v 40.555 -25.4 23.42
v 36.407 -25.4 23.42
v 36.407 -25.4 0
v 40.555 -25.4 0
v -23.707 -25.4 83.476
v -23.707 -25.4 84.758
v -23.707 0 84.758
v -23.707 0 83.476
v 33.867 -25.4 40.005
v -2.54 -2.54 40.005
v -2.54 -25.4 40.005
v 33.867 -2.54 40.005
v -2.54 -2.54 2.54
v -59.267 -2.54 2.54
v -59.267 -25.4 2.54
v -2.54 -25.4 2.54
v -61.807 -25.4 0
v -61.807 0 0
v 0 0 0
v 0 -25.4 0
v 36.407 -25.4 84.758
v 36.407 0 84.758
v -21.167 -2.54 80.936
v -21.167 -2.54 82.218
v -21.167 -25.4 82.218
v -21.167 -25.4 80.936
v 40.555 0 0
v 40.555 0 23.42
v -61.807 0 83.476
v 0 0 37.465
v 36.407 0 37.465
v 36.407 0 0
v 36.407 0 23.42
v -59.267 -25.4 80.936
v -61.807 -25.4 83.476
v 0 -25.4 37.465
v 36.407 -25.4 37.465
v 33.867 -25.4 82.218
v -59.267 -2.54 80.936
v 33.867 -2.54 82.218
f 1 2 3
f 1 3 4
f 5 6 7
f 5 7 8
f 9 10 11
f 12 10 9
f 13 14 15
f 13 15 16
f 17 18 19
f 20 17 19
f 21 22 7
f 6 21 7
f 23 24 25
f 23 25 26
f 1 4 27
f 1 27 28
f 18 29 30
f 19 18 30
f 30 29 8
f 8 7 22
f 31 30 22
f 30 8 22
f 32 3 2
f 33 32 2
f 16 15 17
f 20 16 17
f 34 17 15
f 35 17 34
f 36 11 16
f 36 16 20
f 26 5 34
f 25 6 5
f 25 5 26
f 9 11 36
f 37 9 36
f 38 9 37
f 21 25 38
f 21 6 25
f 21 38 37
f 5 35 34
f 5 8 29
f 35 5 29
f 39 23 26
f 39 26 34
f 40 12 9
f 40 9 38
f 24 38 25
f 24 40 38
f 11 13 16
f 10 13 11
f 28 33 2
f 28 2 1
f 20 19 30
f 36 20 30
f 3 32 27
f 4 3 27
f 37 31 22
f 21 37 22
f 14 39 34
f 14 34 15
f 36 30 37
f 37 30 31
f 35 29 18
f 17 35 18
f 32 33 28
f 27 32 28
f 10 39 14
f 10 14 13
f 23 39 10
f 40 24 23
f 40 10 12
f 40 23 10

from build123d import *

# Parameters (mm, degrees)
F0_W     = 23.7066559494
F0_H     = 46.0103526711
F1_DEPTH = 25.4
F0_W_2   = 4.1480958462
F0_H_2   = 23.419957608
F2_T     = -2.54


with BuildPart() as f1:
    # F0 (on Front) → F1 (new body)
    with BuildSketch(Plane.XZ):
        Polygon((-23.7066559494, 84.7575515509), (-23.7066559494, 83.4757313132), (0, 83.4757313132), (0, 37.4653786421), (36.4066660404, 37.4653786421), (36.4066660404, 84.7575515509), align=None)
        Polygon((-23.7066559494, 83.4757313132), (-61.8066713214, 83.4757313132), (-61.8066713214, 0), (0, 0), (0, 37.4653786421), (-23.7066559494, 37.4653786421), align=None)
        with Locations((-11.8533279747, 60.4705549777)):
            Rectangle(F0_W, F0_H)
    extrude(amount=F1_DEPTH)

    # F2
    f2_openings = [f1.faces().sort_by_distance(p)[0] for p in [
        (-18.586419, -25.4, 46.750427),
    ]]
    offset(amount=F2_T, openings=f2_openings, kind=Kind.INTERSECTION)


with BuildPart() as f1b:
    # F0 (on Front) → F1, piece 2 (new body)
    with BuildSketch(Plane.XZ):
        with Locations((38.4807139635, 11.709978804)):
            Rectangle(F0_W_2, F0_H_2)
    extrude(amount=F1_DEPTH)


solid = Compound([f1.part, f1b.part])
